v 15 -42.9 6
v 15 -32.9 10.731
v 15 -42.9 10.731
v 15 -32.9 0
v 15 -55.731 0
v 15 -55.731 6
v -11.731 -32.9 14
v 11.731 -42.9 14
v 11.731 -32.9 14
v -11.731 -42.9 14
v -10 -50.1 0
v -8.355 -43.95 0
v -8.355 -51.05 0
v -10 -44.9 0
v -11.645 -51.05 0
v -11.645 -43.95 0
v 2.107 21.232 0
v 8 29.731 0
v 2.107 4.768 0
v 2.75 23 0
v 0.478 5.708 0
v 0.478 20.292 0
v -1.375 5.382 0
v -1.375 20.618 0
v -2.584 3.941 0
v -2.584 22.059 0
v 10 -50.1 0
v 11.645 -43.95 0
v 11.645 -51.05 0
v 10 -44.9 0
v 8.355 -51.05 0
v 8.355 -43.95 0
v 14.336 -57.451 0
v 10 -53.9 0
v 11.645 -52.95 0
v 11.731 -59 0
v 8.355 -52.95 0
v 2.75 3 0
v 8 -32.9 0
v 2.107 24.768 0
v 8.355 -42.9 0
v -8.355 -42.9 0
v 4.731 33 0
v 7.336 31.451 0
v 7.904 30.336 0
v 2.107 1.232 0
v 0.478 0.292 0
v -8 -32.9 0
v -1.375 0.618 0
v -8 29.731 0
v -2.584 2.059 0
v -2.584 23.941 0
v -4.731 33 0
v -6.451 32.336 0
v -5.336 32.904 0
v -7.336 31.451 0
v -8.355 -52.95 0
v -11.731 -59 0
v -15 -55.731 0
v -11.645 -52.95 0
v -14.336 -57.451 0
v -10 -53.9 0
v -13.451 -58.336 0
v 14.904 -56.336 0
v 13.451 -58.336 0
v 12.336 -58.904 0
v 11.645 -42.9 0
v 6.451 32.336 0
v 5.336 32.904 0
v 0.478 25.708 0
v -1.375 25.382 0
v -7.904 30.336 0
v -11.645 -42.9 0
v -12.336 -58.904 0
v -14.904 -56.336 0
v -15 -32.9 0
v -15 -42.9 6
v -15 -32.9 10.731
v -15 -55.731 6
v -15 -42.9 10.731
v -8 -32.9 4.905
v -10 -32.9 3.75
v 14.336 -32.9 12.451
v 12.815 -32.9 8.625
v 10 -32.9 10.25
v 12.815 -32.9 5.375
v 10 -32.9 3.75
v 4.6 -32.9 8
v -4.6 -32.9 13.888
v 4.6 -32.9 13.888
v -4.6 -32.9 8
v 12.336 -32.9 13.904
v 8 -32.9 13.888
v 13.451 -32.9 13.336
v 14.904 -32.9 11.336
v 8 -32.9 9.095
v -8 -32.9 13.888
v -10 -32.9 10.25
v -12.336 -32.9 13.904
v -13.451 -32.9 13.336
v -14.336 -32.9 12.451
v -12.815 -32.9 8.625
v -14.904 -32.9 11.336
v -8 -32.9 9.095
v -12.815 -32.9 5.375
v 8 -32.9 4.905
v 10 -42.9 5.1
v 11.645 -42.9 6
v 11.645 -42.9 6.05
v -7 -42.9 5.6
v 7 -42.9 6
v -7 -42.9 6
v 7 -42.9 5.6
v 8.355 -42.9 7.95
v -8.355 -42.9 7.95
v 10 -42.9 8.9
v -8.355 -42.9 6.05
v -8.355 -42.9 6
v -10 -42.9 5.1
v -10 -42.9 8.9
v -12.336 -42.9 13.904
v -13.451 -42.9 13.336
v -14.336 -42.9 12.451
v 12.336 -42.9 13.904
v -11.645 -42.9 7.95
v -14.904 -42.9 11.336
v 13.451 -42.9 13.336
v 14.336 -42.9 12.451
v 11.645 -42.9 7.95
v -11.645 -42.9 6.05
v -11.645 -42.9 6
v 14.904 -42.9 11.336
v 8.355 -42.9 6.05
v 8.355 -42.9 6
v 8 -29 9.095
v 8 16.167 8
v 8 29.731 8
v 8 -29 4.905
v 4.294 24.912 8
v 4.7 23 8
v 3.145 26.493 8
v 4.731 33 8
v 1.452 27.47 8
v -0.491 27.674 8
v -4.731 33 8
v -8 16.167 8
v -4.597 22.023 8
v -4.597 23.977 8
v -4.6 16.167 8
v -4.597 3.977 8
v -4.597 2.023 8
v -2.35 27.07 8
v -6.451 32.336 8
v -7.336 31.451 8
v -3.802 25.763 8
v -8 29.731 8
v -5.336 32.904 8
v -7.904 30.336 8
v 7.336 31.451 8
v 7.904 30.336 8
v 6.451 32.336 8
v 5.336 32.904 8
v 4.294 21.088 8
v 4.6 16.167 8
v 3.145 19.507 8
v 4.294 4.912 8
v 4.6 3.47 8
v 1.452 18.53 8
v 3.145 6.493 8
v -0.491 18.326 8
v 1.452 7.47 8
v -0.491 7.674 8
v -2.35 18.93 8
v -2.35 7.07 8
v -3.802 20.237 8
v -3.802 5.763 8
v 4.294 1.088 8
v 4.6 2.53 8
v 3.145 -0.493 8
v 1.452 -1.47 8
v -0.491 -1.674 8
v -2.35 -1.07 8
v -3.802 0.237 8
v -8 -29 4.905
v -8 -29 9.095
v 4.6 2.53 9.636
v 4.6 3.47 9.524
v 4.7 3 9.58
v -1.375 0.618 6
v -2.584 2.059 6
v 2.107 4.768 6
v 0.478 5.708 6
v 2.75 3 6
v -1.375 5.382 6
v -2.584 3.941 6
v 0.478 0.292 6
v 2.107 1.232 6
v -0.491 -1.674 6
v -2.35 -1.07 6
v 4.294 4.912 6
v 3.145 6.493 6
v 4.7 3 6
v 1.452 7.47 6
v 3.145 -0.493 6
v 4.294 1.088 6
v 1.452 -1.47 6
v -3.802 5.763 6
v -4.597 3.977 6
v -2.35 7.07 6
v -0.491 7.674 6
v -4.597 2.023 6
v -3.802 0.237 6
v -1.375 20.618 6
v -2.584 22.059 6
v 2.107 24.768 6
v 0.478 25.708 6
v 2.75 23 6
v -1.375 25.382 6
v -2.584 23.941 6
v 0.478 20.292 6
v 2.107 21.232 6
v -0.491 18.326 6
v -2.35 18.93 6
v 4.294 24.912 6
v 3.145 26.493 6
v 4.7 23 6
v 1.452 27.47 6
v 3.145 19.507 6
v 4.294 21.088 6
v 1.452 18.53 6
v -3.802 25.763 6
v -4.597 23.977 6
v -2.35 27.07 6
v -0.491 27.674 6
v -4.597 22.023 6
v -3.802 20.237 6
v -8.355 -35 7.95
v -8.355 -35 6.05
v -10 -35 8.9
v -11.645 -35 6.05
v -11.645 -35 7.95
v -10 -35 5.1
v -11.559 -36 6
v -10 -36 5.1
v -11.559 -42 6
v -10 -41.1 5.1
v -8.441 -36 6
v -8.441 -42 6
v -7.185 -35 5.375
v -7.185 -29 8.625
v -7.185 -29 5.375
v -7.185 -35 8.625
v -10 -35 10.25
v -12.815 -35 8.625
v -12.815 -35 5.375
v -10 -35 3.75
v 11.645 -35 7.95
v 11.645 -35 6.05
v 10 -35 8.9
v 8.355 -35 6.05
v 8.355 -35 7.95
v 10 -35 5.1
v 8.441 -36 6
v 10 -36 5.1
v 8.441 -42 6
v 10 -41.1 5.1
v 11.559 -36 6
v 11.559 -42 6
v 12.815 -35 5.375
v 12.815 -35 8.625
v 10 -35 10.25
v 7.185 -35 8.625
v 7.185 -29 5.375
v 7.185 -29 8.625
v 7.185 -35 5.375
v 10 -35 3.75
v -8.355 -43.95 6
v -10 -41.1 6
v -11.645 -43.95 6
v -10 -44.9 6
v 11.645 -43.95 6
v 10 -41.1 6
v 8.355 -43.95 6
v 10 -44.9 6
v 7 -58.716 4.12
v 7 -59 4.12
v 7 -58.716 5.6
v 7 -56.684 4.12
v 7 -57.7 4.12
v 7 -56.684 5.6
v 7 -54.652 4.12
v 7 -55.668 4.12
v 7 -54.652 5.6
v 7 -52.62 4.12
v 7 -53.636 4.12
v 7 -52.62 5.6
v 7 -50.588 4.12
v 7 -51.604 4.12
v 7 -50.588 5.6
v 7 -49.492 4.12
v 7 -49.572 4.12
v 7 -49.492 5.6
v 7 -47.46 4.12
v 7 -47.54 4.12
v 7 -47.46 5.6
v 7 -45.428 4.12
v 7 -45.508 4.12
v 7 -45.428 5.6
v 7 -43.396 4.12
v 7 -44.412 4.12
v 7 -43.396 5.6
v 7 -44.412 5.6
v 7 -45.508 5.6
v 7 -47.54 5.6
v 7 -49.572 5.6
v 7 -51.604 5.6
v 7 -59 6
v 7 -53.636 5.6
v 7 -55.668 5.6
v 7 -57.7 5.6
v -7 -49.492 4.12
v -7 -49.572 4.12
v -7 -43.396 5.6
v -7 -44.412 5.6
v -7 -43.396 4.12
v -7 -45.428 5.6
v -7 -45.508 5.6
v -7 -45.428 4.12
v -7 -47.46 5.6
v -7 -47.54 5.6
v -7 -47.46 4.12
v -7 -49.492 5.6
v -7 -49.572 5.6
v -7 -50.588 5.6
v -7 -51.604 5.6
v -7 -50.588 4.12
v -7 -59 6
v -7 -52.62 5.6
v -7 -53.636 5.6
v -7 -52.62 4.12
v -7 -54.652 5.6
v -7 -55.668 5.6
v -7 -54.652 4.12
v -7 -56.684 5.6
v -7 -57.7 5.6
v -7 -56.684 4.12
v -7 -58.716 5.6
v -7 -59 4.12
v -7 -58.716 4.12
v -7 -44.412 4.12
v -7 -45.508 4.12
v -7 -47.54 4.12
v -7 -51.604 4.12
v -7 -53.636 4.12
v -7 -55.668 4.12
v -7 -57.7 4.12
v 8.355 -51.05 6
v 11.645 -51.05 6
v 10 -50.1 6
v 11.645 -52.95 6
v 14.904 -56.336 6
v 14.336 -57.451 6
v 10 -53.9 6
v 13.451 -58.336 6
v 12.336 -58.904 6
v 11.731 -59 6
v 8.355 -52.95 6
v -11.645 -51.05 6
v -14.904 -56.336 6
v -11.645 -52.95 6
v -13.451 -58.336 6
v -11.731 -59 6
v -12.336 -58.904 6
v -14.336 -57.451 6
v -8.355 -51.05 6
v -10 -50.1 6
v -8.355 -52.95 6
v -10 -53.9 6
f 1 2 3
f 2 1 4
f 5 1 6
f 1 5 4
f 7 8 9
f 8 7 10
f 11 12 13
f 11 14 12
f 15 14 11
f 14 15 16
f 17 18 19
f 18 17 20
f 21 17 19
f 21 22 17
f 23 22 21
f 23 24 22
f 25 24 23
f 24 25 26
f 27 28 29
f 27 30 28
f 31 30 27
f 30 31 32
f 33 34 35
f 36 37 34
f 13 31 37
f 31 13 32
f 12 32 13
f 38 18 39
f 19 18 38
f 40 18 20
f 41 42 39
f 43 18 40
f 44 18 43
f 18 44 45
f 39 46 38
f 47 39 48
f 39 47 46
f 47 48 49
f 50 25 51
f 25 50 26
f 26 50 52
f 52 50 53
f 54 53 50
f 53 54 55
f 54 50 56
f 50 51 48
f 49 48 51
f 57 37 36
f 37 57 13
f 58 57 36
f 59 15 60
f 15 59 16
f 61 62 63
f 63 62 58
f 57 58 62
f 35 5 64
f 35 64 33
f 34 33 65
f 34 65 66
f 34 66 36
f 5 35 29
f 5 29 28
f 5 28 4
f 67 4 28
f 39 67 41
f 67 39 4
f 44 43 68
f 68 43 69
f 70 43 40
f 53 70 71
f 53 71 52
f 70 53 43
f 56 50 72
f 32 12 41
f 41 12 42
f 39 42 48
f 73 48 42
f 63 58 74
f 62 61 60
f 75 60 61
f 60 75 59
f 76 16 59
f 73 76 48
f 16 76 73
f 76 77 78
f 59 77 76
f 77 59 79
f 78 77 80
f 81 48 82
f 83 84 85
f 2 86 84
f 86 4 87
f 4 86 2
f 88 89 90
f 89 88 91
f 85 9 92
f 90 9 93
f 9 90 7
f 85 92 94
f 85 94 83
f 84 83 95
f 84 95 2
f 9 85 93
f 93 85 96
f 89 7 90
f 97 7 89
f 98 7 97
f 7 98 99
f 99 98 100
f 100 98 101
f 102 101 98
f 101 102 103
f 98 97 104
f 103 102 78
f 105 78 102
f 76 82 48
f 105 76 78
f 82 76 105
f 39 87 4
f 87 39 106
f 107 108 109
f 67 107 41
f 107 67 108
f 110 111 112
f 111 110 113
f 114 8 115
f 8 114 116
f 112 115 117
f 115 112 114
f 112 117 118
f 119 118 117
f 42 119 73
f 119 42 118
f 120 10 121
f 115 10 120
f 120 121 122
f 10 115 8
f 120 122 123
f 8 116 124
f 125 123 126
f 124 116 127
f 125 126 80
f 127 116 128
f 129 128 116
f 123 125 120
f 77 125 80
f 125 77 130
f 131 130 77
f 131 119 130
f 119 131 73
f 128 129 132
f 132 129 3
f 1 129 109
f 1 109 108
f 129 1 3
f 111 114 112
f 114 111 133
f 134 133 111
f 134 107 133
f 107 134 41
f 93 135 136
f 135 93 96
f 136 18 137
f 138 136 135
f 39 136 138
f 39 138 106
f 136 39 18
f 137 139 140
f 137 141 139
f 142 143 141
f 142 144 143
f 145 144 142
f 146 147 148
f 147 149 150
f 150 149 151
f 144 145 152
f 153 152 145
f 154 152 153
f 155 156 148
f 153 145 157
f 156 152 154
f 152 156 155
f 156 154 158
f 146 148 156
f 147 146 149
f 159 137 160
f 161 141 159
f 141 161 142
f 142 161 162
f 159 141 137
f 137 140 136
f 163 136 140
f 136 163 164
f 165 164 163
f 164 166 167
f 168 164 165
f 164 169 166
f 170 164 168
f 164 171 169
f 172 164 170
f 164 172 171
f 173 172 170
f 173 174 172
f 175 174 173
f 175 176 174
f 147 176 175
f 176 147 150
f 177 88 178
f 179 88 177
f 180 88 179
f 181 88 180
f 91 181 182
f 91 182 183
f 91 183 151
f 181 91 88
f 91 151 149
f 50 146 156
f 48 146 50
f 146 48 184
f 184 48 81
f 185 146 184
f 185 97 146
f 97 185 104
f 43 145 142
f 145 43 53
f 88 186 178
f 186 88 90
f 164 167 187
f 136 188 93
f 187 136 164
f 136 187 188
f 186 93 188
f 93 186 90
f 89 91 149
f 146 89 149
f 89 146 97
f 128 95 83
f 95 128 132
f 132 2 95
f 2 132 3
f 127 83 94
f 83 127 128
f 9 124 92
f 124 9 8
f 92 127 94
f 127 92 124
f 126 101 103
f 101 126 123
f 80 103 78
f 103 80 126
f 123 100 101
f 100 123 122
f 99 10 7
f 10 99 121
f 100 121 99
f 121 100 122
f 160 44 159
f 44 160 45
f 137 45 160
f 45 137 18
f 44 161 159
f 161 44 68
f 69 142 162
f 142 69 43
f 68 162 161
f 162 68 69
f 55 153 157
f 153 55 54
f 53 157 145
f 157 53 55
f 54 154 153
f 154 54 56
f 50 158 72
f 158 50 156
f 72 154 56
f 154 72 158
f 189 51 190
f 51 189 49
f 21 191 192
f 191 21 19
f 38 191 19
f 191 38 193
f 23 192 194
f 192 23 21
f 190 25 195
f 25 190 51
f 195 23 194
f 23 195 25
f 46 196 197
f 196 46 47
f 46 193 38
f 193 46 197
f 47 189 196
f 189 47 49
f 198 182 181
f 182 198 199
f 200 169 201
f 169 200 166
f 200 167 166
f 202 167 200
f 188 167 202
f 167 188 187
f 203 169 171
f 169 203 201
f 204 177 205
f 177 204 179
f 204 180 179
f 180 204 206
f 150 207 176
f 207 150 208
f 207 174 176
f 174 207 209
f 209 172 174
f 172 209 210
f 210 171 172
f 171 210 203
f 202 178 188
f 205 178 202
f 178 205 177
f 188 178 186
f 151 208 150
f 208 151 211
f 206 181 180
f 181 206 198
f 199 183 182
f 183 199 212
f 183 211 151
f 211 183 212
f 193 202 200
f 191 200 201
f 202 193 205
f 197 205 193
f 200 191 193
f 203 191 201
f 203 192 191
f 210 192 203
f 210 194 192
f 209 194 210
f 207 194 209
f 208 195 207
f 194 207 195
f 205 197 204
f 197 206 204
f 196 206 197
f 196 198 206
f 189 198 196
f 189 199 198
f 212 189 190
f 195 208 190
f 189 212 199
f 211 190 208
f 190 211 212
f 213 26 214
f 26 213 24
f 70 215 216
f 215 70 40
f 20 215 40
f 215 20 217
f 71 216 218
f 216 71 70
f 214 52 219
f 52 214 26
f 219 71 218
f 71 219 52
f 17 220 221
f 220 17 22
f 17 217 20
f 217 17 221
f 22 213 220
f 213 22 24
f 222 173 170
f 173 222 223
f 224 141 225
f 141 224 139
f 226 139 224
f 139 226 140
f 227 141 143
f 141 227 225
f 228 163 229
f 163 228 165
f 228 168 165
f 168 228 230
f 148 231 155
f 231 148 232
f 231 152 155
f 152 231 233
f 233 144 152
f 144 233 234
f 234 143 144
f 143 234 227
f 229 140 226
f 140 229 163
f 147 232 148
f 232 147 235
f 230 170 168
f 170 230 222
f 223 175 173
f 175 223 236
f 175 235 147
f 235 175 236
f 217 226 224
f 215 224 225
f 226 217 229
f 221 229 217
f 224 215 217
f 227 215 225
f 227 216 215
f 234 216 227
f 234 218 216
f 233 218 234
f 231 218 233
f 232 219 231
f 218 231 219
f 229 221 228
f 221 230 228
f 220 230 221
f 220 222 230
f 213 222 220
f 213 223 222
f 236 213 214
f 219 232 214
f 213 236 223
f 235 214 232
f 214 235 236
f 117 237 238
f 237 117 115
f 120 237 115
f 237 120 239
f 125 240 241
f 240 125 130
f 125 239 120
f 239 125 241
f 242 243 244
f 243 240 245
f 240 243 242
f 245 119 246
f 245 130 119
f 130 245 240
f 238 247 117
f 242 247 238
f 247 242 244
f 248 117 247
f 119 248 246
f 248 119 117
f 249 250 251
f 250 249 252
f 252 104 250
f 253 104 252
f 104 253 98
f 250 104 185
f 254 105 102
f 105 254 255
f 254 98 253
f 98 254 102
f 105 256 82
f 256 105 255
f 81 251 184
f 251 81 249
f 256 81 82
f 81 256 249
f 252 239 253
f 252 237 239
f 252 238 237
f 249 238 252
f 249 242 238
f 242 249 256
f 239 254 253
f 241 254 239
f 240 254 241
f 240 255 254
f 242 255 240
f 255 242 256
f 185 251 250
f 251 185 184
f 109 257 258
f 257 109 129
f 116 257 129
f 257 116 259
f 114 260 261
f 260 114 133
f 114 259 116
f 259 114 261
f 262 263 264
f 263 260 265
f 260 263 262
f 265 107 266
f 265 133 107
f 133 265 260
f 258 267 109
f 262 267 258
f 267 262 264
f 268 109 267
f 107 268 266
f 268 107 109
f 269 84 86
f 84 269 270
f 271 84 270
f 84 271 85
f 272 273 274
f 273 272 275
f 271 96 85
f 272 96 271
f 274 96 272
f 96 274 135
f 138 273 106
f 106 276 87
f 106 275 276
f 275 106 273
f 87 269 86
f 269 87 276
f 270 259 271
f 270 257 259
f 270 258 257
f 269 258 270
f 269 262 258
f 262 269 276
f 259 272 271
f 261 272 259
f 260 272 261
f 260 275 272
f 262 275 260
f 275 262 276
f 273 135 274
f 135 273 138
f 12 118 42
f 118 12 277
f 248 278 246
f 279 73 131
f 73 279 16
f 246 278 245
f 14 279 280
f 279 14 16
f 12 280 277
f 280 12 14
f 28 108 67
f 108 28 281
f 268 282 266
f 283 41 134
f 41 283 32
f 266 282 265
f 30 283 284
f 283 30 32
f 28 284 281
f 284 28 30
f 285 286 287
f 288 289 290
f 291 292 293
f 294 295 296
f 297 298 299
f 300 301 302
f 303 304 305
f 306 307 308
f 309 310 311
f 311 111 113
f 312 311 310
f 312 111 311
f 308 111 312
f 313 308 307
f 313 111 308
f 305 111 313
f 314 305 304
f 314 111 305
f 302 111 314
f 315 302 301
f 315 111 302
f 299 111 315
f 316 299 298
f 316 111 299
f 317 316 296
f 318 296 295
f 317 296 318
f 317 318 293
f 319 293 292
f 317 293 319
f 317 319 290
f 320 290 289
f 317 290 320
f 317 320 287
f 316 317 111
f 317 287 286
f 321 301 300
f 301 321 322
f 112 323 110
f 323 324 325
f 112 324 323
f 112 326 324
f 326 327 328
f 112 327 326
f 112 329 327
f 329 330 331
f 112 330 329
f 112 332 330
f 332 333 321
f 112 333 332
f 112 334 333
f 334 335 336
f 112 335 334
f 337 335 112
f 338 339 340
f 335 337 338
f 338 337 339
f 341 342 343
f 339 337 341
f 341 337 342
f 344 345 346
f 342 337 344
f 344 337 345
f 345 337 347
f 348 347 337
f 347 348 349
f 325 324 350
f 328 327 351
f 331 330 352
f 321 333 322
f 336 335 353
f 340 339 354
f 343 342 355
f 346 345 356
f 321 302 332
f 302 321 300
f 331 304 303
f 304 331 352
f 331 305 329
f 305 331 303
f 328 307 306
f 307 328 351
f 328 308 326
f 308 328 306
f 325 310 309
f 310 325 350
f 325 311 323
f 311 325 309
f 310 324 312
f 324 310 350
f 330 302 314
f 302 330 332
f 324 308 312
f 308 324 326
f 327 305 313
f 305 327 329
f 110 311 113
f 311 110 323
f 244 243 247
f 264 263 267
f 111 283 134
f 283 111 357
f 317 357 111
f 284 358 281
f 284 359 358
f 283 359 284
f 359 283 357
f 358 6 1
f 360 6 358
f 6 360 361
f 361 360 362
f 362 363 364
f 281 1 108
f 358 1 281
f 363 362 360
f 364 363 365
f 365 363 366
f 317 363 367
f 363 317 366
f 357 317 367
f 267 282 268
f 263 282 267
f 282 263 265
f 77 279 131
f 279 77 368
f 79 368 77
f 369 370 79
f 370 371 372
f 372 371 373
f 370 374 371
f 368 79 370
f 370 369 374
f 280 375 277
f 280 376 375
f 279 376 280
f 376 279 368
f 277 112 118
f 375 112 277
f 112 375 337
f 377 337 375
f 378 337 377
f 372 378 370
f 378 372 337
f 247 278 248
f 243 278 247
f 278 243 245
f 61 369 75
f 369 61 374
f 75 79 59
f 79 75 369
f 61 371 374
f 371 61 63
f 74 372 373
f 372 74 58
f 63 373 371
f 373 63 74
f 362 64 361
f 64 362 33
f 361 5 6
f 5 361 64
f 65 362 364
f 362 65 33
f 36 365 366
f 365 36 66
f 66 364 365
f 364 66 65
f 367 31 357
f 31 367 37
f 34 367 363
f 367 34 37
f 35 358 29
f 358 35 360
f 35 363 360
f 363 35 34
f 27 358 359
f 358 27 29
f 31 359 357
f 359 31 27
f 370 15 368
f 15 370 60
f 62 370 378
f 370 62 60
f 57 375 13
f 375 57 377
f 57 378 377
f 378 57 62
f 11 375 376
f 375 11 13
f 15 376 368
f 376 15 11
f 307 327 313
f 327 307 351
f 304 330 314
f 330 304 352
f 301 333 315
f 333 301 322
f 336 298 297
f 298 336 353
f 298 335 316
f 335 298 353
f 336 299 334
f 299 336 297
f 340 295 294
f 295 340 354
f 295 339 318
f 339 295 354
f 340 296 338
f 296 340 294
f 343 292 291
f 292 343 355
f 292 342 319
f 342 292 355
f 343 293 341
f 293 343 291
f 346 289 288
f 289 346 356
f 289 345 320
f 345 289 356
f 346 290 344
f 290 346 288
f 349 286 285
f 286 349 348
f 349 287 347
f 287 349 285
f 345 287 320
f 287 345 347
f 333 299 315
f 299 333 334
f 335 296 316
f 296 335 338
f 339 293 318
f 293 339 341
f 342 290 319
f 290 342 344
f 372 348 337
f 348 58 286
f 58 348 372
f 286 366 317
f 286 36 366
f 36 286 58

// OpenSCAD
// [FL_INDEX: keywords="openscad, 3d_parametric, Shapeoko_Belt_Clamp, csg_solid" | COT="Parametric OpenSCAD design from 3DCodeverse"]
// Title: Shapeoko Belt Clamp

// ===== file: beltclamp.scad =====
// This printed part is one possible way to anchor Shapeoko belts.
// See http://www.shapeoko.com/wiki/index.php/Belt_Anchors for other ideas.
// Motivated by http://www.thingiverse.com/thing:33881 not being strong enough
// when I initially printed it.

// Upright: printed, but not stress tested, looks sturdy
// Top: completely untested

gThick = 8;
gRibHeight = 6;
gTopRoundoverRadius = 4;
gSideRoundoverRadius = 4;
gMainWidth = 16;
gTopWidth = 30;
gRibWidth = 3.4;
gHoleSpacing = 20;
gBeltWide = 14; // 1/4" belt + slop
gBeltPitch = 2.032; // MXL in mm
gBeltThick = 1.5;
e = 0.02;

// screw_clearance_diameter, socket_head_clearance_diameter, nut outside diameter
// TODO untested numbers, these should move to a common include.
M3 = [3.5, 6.4, 6.4];
M5 = [5.5, 9.4, 9.4];
M8 = [8, 13, 13];

module InsetHole(x) {
  d = x[0];
  socket_head = x[1];
  union() {
    translate([0,0,-50]) cylinder(r=d/2, h=100);
    cylinder(r=socket_head/2, h=10);
  }
}

module NutHole(x) {
  d = x[0];
  nut_size = x[2];
  union() {
    translate([0,0,1]) cylinder(r=d/2, h=50);
    cylinder(r=nut_size/2, $fn=6, h=6);
  }
}

module Rib(t=4) {
  translate([-t/2,0,-0.1])
    rotate([90,0,90])
      linear_extrude(height=t)
        polygon(points=[[0,0],[40,0],[0,gRibHeight]],paths=[[0,1,2]]);
}

module Roundover(r) {
  translate([0.1,0.1,-50])
    difference() {
      cube([r,r,100]);
      translate([0,0,-1]) cylinder(r=r,h=102,$fn=20);
    }
}

module Upright() {
  difference() {
    union() {
      // body, for now (until beziers work)
      translate([0,-25,(gThick+gRibHeight)/2]) cube([gTopWidth,10,gThick+gRibHeight], center=true);
      translate([0,0,gThick/2]) cube([gMainWidth,60,gThick], center=true);
      // ribs
      translate([(gMainWidth-gRibWidth)/2,-20,gThick]) Rib(t=gRibWidth);
      translate([-(gMainWidth-gRibWidth)/2,-20,gThick]) Rib(t=gRibWidth);
    }
    // Chamfer top edges
    // TODO make these translation numbers constants as well, and fix Roundover's
    // origin.
    translate([gTopWidth/2-gTopRoundoverRadius,0,gThick+gRibHeight-gTopRoundoverRadius])
      rotate([90,0,0])
        Roundover(r=gTopRoundoverRadius);
    translate([-(gTopWidth/2-gTopRoundoverRadius),0,gThick+gRibHeight-gTopRoundoverRadius])
      rotate([90,0,180])
        Roundover(r=gTopRoundoverRadius);
    // Chamfer edges near bottom mounting hole
    translate([gMainWidth/2-gSideRoundoverRadius,26,0])
      Roundover(r=gSideRoundoverRadius);
    translate([-(gMainWidth/2-gSideRoundoverRadius),26,0])
      rotate([0,0,90])
        Roundover(r=gSideRoundoverRadius);
    // M5 mounting holes
    translate([0,0,gThick-2]) InsetHole(M5);
    translate([0,20,gThick-2]) InsetHole(M5);
    // M3 nut traps (20mm spacing, for compat with old part)
    translate([-gHoleSpacing/2,-16,(gThick+gRibHeight)/2]) rotate([90,-90,0]) NutHole(M3);
    translate([gHoleSpacing/2,-16,(gThick+gRibHeight)/2]) rotate([90,-90,0]) NutHole(M3);
  }
}

module Belt() {
  translate([0,0,gBeltThick/2]) cube([gBeltWide,30,gBeltThick], center=true);
  for(i = [0:30/gBeltPitch]) {
    translate([0,i * gBeltPitch,-gBeltThick/2+e]) cube([gBeltWide,gBeltPitch / 2,gBeltThick], center=true);
  }
}

module Top() {
  rotate([-90,0,0]) difference() {
    translate([0,-5,(gThick+gRibHeight)/2]) cube([gTopWidth,10,gThick+gRibHeight], center=true);
    // holes
    translate([-gHoleSpacing/2,20,(gThick+gRibHeight)/2]) rotate([90,-90,0]) NutHole(M3);
    translate([gHoleSpacing/2,20,(gThick+gRibHeight)/2]) rotate([90,-90,0]) NutHole(M3);
    // chamfer
    translate([gTopWidth/2-gTopRoundoverRadius,0,gThick+gRibHeight-gTopRoundoverRadius])
      rotate([90,0,0])
        Roundover(r=gTopRoundoverRadius);
    translate([-(gTopWidth/2-gTopRoundoverRadius),0,gThick+gRibHeight-gTopRoundoverRadius])
      rotate([90,0,180])
        Roundover(r=gTopRoundoverRadius);
    // TODO remove 12 as magic number
    translate([0,-12+(1.6*gBeltThick),0]) rotate([90,0,0]) Belt();
  }
}

union() {
  Upright();
  translate([0,-50,0]) Top();
}

// ===== file: beltclamp_v2.scad =====
// This printed part is one possible way to anchor Shapeoko belts.
// See http://www.shapeoko.com/wiki/index.php/Belt_Anchors for other ideas.
// Motivated by http://www.thingiverse.com/thing:33881 not being strong enough
// when I initially printed it.

// Upright: printed, but not stress tested, looks sturdy
// Top: completely untested

gThick = 8;
gRibHeight = 6;
gTopRoundoverRadius = 4;
gSideRoundoverRadius = 4;
gMainWidth = 16;
gMainHeight = 66;

gTopWidth = 30;
gRibWidth = 3.4;
gRibLength = 50;
gHoleSpacing = 20;
gBeltWide = 14; // 1/4" belt + slop
gBeltPitch = 2.032; // MXL in mm
gBeltThick = 1.5;
e = 0.02;

// screw_clearance_diameter, socket_head_clearance_diameter, nut outside diameter
// TODO untested numbers, these should move to a common include.
M3 = [3.8, 6.4, 6.5];
M5 = [5.5, 9.4, 9.4];
M8 = [8, 13, 13];

module InsetHole(x) {
  d = x[0];
  socket_head = x[1];
  union() {
    translate([0,0,-50]) cylinder(r=d/2, h=100);
    cylinder(r=socket_head/2, h=10);
  }
}

module NutHole(x) {
  d = x[0];
  nut_size = x[2];
  union() {
    translate([0,0,1]) cylinder(r=d/2, h=50);
    cylinder(r=nut_size/2, $fn=6, h=6);
  }
}

module Rib(t=4) {
  translate([-t/2,0,-0.1])
    rotate([90,0,90])
      linear_extrude(height=t)
        polygon(points=[[0,0],[gRibLength,0],[0,gRibHeight]],paths=[[0,1,2]]);
}

module Roundover(r) {
  translate([0.1,0.1,-50])
    difference() {
      cube([r,r,100]);
      translate([0,0,-1]) cylinder(r=r,h=102,$fn=20);
    }
}

module Upright() {
  difference() {
    union() {
      // body, for now (until beziers work)
      translate([0,-gMainHeight/2-4.9,(gThick+gRibHeight)/2]) cube([gTopWidth,10,gThick+gRibHeight], center=true);
      translate([0,0,gThick/2]) cube([gMainWidth,gMainHeight,gThick], center=true);
      // ribs
      translate([(gMainWidth-gRibWidth)/2,-gMainHeight/2,gThick]) Rib(t=gRibWidth);
      translate([-(gMainWidth-gRibWidth)/2,-gMainHeight/2,gThick]) Rib(t=gRibWidth);
    }
    // Chamfer top edges
    // TODO make these translation numbers constants as well, and fix Roundover's
    // origin.
    translate([gTopWidth/2-gTopRoundoverRadius,0,gThick+gRibHeight-gTopRoundoverRadius])
      rotate([90,0,0])
        Roundover(r=gTopRoundoverRadius);
    translate([-(gTopWidth/2-gTopRoundoverRadius),0,gThick+gRibHeight-gTopRoundoverRadius])
      rotate([90,0,180])
        Roundover(r=gTopRoundoverRadius);
    // Chamfer edges near bottom mounting hole
    translate([gMainWidth/2-gSideRoundoverRadius,gMainHeight/2-4,0])
      Roundover(r=gSideRoundoverRadius);
    translate([-(gMainWidth/2-gSideRoundoverRadius),gMainHeight/2-4,0])
      rotate([0,0,90])
        Roundover(r=gSideRoundoverRadius);
    // M5 mounting holes
    translate([0,gMainHeight/2-30,gThick-2]) InsetHole(M5);
    translate([0,gMainHeight/2-10,gThick-2]) InsetHole(M5);
    // M3 nut traps (20mm spacing, for compat with old part)
    translate([-gHoleSpacing/2,-gMainHeight/2+4,(gThick+gRibHeight)/2]) rotate([90,-90,0]) NutHole(M3);
    translate([gHoleSpacing/2,-gMainHeight/2+4,(gThick+gRibHeight)/2]) rotate([90,-90,0]) NutHole(M3);
  }
}

module Belt() {
  translate([0,0,gBeltThick/2]) cube([gBeltWide,30,gBeltThick], center=true);
  for(i = [0:30/gBeltPitch]) {
    translate([0,i * gBeltPitch,-gBeltThick/2+e]) cube([gBeltWide,gBeltPitch / 2,gBeltThick], center=true);
  }
}

module Top() {
  rotate([-90,0,0]) difference() {
    translate([0,-6/2,(gThick+gRibHeight)/2]) cube([gTopWidth,6,gThick+gRibHeight], center=true);
    // holes
    translate([-gHoleSpacing/2,20,(gThick+gRibHeight)/2]) rotate([90,-90,0]) NutHole(M3);
    translate([gHoleSpacing/2,20,(gThick+gRibHeight)/2]) rotate([90,-90,0]) NutHole(M3);
    // chamfer
    translate([gTopWidth/2-gTopRoundoverRadius,0,gThick+gRibHeight-gTopRoundoverRadius])
      rotate([90,0,0])
        Roundover(r=gTopRoundoverRadius);
    translate([-(gTopWidth/2-gTopRoundoverRadius),0,gThick+gRibHeight-gTopRoundoverRadius])
      rotate([90,0,180])
        Roundover(r=gTopRoundoverRadius);
    // TODO remove magic number
    translate([0,-8+(1.6*gBeltThick),0]) rotate([90,0,0]) Belt();
  }
}

union() {
  Upright();
  translate([0,-gMainHeight/2-12,0]) rotate([0,0,180]) Top();
}
//union() {
//  for(i=[1:4]) {
//    translate([0,-15*i,0]) Top();
//  }
//}
